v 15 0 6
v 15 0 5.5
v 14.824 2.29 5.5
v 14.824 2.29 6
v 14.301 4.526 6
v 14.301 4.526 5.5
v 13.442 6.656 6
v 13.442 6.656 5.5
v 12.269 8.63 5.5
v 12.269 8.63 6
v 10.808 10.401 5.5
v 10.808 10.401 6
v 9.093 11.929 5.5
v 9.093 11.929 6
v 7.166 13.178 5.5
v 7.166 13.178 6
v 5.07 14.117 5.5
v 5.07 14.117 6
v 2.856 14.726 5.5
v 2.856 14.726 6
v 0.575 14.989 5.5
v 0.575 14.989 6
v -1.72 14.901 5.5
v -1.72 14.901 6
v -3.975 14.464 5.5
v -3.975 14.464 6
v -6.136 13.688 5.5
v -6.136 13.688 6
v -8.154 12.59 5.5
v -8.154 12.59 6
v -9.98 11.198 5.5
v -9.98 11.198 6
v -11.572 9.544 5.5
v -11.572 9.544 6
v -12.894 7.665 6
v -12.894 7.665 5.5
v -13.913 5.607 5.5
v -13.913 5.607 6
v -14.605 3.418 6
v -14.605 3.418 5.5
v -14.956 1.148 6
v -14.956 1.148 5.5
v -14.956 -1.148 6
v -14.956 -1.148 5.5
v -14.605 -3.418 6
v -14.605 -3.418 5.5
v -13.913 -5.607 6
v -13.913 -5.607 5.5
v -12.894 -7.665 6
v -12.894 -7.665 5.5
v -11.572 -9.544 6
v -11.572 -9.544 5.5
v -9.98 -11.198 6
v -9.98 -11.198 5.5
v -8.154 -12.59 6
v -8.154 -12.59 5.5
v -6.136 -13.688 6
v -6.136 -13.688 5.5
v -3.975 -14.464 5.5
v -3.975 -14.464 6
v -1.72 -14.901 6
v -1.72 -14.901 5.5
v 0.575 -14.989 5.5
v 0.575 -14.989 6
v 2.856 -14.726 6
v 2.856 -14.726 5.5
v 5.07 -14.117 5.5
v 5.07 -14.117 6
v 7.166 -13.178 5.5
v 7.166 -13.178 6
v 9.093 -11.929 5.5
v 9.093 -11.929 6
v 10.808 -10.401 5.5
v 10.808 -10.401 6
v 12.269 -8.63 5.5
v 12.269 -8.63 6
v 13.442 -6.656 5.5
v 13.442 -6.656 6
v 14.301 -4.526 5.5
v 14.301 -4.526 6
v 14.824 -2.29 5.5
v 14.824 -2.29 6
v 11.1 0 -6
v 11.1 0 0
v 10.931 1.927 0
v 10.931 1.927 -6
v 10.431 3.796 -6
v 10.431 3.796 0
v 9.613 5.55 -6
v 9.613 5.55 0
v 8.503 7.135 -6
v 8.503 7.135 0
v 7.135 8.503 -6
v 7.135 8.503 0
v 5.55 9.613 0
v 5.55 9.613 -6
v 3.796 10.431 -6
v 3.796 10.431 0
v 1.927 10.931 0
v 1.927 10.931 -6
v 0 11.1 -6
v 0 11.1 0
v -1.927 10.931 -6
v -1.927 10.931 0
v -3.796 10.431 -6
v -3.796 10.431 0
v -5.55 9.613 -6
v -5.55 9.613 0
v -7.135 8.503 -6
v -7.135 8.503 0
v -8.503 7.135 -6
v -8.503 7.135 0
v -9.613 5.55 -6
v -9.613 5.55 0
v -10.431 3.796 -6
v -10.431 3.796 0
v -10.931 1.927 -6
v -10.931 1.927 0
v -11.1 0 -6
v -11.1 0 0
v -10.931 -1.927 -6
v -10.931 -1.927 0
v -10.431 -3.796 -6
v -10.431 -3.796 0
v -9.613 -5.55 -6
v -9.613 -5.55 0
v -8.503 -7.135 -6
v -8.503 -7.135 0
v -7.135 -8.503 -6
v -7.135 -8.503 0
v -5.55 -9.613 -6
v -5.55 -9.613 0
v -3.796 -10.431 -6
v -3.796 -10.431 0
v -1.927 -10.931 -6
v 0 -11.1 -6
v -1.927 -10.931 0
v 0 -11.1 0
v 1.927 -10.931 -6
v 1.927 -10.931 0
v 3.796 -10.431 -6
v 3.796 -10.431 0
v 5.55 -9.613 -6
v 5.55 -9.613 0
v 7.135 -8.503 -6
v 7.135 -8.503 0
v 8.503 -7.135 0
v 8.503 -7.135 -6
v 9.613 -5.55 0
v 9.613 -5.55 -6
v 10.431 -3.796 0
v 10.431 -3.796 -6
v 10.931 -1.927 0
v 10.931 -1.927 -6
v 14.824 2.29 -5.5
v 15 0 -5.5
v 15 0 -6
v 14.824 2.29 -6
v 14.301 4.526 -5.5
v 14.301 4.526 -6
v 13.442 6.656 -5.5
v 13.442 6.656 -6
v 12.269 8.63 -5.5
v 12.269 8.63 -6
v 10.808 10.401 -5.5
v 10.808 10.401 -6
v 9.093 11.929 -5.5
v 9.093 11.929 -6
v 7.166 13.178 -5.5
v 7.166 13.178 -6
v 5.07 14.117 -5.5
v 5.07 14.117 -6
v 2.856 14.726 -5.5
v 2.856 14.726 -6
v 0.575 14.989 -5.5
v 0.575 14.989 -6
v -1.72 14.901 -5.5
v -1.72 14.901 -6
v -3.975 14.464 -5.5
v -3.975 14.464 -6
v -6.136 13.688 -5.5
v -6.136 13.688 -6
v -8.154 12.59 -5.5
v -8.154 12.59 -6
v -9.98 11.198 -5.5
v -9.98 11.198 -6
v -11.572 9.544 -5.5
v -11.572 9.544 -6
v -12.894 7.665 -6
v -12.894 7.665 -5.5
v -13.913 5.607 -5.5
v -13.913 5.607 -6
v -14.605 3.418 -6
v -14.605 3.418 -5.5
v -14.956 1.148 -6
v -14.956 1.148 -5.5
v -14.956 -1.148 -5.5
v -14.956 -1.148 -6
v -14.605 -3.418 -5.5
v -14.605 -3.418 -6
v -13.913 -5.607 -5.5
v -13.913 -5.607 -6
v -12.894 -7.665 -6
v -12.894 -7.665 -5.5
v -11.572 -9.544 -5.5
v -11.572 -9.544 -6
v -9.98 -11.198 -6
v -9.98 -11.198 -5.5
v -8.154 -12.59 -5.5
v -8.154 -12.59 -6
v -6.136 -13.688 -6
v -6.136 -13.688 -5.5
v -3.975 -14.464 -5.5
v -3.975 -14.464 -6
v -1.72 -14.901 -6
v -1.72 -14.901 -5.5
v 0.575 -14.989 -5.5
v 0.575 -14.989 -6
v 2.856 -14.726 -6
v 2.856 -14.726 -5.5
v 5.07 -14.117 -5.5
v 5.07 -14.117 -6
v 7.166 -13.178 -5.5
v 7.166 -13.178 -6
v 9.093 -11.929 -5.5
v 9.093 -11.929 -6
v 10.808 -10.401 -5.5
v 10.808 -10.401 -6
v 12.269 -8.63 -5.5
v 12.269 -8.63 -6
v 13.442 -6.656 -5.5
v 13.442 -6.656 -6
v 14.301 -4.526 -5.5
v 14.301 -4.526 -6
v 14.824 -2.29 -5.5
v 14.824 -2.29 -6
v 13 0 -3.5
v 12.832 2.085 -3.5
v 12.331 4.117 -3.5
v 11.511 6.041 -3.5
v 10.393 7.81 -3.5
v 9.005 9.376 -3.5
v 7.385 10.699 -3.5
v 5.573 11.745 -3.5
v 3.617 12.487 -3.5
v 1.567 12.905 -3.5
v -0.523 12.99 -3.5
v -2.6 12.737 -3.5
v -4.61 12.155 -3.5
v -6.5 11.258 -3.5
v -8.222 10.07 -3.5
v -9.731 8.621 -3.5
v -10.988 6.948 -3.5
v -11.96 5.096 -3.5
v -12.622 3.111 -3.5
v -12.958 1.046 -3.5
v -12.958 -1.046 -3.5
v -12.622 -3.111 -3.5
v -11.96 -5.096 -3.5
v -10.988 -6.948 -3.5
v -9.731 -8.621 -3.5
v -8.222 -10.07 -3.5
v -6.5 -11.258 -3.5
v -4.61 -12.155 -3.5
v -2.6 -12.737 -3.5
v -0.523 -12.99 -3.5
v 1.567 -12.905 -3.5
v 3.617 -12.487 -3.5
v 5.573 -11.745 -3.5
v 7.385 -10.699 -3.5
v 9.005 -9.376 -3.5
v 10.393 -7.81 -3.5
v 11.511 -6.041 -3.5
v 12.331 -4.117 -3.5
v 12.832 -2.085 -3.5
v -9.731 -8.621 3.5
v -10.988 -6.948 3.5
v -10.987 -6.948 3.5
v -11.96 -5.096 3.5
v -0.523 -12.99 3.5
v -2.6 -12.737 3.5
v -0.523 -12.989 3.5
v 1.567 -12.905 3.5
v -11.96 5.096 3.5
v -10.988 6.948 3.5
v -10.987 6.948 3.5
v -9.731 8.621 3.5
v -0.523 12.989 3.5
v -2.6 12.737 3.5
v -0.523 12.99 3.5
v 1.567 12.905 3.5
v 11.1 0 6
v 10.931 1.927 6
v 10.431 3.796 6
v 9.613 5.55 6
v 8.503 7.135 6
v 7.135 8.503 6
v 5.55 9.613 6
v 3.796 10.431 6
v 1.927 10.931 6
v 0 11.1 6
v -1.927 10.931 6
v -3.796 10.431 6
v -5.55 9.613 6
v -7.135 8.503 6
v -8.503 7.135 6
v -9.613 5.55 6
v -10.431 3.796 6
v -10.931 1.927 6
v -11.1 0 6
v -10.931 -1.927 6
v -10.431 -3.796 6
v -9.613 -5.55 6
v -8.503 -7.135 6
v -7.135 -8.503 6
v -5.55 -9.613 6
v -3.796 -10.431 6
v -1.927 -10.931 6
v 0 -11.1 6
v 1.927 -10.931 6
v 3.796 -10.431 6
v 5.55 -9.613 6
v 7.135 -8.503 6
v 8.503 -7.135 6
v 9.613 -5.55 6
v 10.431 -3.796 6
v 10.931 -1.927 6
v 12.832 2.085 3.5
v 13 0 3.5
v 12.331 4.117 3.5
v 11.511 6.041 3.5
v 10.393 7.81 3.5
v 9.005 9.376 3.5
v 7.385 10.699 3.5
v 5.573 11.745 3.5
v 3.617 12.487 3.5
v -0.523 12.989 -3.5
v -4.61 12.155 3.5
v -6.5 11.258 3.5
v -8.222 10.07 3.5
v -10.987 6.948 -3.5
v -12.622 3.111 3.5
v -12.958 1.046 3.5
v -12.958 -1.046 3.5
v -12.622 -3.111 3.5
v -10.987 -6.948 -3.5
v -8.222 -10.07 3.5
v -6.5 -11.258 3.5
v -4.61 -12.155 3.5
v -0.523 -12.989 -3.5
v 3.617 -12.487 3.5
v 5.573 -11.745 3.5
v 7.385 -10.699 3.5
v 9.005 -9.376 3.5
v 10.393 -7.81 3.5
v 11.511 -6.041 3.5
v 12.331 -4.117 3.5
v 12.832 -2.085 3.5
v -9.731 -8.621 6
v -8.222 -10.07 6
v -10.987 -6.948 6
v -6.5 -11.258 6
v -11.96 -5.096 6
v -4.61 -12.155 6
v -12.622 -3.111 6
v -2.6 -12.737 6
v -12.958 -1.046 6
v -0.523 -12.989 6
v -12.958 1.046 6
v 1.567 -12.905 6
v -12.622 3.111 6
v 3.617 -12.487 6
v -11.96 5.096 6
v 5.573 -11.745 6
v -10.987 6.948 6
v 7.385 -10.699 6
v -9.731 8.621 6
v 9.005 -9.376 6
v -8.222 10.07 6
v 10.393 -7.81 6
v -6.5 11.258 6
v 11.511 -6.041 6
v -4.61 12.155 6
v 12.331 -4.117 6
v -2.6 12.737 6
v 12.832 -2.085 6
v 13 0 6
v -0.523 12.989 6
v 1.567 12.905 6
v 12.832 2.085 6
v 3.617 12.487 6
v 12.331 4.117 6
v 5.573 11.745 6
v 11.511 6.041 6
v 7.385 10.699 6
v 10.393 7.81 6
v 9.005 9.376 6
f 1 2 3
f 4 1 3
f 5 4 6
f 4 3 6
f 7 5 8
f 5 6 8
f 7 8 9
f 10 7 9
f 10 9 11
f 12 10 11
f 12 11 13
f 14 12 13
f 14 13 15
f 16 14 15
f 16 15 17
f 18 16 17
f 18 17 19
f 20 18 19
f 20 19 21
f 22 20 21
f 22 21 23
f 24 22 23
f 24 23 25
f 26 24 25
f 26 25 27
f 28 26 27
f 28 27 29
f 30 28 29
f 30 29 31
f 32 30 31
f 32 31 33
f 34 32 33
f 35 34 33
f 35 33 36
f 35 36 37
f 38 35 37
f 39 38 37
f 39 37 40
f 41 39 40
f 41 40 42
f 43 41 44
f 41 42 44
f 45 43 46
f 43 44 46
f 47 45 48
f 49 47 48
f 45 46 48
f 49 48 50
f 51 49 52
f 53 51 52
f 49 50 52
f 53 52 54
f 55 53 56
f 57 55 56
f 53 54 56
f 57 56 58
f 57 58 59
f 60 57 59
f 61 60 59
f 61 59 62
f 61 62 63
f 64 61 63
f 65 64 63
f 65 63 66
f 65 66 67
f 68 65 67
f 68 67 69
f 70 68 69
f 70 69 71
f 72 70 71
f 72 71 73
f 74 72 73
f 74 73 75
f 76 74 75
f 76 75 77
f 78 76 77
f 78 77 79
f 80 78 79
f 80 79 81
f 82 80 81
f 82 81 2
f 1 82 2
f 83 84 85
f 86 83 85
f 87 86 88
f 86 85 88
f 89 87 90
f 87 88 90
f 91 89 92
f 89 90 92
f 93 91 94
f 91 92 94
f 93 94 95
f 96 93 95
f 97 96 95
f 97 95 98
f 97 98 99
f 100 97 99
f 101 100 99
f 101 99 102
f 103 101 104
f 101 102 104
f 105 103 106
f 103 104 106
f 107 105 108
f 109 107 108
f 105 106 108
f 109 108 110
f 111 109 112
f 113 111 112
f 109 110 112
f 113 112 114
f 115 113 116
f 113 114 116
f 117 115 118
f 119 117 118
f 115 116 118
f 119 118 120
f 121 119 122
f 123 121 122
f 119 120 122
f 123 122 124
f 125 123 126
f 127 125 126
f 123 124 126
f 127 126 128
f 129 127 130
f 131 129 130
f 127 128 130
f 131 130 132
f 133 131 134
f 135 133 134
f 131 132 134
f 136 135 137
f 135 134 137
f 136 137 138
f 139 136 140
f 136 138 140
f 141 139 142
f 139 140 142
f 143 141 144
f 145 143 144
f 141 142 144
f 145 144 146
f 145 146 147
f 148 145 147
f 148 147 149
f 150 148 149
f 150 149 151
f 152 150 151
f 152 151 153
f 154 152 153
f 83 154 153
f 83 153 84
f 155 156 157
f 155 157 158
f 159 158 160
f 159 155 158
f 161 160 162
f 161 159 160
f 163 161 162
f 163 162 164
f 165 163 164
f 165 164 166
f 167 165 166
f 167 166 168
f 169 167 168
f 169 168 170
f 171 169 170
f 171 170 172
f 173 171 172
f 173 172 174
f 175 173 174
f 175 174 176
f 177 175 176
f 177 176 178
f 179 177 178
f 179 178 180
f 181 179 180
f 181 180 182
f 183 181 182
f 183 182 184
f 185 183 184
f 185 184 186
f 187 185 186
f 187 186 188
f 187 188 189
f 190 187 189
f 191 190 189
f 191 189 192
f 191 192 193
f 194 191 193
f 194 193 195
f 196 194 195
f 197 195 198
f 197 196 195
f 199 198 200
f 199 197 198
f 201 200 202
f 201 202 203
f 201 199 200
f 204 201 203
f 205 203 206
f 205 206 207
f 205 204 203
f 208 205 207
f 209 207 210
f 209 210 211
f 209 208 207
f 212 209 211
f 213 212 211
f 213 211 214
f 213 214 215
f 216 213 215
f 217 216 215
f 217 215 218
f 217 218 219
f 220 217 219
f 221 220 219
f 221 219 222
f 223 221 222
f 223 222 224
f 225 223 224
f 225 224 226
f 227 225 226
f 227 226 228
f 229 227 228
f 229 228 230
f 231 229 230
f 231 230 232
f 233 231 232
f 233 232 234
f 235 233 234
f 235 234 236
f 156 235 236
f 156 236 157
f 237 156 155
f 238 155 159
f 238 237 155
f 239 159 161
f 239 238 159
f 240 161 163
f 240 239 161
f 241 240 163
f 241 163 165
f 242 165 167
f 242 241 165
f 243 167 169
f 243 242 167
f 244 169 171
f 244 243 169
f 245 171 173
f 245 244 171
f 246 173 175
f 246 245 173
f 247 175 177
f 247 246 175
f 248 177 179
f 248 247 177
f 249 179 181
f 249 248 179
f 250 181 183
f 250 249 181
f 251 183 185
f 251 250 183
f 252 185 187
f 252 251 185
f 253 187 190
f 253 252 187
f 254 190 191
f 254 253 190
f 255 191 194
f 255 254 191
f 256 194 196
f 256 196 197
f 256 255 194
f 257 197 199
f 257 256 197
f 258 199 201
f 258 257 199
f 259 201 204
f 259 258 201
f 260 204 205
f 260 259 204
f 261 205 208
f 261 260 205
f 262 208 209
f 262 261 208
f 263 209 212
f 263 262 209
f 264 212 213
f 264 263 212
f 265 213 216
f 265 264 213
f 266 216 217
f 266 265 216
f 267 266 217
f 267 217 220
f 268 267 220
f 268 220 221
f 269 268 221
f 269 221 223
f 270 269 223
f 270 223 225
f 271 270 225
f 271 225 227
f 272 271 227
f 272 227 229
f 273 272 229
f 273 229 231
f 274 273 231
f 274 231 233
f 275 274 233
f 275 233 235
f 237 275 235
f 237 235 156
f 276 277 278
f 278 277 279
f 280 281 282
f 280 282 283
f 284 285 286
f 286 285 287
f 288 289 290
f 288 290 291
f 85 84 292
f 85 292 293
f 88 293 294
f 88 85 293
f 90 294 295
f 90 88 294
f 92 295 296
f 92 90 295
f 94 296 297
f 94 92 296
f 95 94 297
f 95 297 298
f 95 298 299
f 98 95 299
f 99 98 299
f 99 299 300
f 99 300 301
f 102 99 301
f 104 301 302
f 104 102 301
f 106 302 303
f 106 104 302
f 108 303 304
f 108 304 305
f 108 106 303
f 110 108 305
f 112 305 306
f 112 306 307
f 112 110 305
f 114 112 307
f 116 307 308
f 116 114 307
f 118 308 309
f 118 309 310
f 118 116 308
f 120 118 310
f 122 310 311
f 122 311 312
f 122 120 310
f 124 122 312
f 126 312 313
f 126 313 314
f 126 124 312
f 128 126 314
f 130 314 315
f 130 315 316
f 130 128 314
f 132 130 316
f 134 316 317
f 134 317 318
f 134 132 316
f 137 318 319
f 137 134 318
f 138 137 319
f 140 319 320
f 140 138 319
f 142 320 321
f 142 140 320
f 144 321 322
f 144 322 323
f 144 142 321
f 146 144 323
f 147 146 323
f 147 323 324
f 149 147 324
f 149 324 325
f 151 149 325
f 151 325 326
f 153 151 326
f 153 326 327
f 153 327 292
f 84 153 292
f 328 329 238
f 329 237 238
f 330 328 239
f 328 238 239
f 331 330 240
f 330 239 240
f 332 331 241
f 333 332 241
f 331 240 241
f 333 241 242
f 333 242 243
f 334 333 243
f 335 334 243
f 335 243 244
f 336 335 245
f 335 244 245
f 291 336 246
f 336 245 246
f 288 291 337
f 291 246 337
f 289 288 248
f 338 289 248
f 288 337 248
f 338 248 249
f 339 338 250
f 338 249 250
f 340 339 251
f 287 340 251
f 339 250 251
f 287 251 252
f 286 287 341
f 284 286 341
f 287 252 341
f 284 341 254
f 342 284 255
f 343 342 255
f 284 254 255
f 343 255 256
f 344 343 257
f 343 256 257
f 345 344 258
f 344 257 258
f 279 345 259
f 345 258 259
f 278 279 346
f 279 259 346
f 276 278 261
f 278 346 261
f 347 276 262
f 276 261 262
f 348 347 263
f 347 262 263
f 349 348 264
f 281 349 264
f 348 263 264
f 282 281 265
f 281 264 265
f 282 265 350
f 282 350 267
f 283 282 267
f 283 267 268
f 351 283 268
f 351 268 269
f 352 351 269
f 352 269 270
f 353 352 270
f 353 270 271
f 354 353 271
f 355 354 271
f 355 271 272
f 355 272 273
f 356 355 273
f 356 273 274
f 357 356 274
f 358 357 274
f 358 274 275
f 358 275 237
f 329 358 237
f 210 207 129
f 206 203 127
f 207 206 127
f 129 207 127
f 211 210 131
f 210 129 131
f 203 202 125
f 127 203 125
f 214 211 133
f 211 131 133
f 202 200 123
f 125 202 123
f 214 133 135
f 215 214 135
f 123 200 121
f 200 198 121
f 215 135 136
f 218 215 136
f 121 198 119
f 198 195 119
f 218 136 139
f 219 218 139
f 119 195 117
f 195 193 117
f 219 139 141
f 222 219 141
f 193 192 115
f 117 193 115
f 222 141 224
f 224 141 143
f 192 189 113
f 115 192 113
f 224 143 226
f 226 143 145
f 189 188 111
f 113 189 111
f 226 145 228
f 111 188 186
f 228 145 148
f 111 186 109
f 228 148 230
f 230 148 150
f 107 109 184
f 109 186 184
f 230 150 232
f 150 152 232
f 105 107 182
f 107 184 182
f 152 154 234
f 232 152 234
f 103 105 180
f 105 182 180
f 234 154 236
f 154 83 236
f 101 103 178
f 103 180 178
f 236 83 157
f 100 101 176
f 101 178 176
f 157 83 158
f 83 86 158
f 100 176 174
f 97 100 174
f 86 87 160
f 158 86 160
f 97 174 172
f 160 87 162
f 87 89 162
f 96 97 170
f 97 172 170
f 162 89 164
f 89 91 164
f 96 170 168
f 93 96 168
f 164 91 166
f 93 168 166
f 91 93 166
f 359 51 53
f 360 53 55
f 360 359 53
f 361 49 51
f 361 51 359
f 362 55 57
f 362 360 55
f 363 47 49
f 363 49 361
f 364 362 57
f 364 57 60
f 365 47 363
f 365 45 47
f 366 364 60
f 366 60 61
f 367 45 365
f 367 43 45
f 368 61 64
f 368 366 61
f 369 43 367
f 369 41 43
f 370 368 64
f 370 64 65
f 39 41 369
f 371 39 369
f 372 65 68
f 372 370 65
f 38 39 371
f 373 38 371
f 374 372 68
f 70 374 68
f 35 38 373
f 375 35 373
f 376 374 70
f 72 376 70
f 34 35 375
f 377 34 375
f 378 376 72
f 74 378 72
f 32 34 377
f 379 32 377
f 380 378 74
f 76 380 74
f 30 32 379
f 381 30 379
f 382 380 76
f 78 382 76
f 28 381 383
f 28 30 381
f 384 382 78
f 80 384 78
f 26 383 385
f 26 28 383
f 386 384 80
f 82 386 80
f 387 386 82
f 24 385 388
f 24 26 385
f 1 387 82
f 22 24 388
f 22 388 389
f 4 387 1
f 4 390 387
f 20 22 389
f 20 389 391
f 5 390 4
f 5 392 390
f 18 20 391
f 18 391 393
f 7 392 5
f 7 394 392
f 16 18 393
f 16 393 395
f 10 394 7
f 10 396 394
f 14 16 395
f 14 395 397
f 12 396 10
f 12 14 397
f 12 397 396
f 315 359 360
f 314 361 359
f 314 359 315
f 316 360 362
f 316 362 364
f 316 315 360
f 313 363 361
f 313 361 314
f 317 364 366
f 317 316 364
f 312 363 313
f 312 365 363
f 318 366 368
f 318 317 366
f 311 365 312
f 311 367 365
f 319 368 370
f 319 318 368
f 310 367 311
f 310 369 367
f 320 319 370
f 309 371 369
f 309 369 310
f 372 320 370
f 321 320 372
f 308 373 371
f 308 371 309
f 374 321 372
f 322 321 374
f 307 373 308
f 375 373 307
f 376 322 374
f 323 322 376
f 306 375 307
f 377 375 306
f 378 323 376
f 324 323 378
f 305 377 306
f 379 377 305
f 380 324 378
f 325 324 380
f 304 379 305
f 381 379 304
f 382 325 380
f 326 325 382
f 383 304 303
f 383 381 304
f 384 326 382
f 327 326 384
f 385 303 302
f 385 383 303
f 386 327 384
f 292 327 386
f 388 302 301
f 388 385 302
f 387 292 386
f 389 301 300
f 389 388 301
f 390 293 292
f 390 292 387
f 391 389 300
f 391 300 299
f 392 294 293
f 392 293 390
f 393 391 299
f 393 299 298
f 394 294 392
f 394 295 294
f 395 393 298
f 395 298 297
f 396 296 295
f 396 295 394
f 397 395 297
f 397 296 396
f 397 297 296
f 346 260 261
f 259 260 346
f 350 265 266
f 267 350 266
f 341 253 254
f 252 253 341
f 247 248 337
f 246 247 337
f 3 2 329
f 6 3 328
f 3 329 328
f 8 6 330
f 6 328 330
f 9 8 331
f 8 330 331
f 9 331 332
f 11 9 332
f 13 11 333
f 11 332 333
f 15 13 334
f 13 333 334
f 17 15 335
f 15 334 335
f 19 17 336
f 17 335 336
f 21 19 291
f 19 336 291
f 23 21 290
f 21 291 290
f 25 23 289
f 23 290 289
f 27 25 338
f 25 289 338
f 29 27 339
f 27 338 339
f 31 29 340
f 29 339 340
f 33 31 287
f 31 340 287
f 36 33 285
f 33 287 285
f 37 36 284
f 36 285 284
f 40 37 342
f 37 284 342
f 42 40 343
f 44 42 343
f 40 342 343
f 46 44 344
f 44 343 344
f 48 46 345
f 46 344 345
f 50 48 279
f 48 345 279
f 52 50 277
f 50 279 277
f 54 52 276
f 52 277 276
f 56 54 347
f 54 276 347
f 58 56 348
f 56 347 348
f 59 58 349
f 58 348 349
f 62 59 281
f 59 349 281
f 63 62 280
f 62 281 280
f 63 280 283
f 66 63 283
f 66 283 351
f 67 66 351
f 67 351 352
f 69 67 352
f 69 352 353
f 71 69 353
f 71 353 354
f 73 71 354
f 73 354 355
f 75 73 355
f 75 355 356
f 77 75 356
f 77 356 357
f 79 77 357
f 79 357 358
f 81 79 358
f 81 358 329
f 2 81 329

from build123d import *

# Parameters (mm, degrees)
SKETCH1_R           = 15
SKETCH1_R_2         = 13
SKETCH1_R_3         = 11.1
BOSS_EXTRUDE1_DEPTH = 6
SKETCH1_3_R         = 15
SKETCH1_3_R_2       = 13
CUT_EXTRUDE1_DEPTH  = 3.5
CHAMFER1_SIZE       = 2


with BuildPart() as part:
    # Sketch1 → Boss-Extrude1 (new, symmetric)
    # profile 1 of 2: a face of its own
    with BuildSketch(Plane.XY):
        Circle(SKETCH1_R)
        Circle(SKETCH1_R_2, mode=Mode.SUBTRACT)
    # profile 2 of 2: a face of its own
    with BuildSketch(Plane.XY):
        Circle(SKETCH1_R_2)
        Circle(SKETCH1_R_3, mode=Mode.SUBTRACT)
    extrude(amount=BOSS_EXTRUDE1_DEPTH, both=True)

    # Sketch1<3> → Cut-Extrude1 (cut, symmetric)
    with BuildSketch(Plane.XY):
        Circle(SKETCH1_3_R)
        Circle(SKETCH1_3_R_2, mode=Mode.SUBTRACT)
    extrude(amount=CUT_EXTRUDE1_DEPTH, both=True, mode=Mode.SUBTRACT)

    # Chamfer1
    chamfer1_edges = [part.edges().sort_by_distance(p)[0] for p in [
        (-15, 0, -3.5),
        (-15, 0, 3.5),
    ]]
    chamfer(chamfer1_edges, length=CHAMFER1_SIZE - 0.0001)  # a hair under: the kernel refuses the full size


solid = part.part
